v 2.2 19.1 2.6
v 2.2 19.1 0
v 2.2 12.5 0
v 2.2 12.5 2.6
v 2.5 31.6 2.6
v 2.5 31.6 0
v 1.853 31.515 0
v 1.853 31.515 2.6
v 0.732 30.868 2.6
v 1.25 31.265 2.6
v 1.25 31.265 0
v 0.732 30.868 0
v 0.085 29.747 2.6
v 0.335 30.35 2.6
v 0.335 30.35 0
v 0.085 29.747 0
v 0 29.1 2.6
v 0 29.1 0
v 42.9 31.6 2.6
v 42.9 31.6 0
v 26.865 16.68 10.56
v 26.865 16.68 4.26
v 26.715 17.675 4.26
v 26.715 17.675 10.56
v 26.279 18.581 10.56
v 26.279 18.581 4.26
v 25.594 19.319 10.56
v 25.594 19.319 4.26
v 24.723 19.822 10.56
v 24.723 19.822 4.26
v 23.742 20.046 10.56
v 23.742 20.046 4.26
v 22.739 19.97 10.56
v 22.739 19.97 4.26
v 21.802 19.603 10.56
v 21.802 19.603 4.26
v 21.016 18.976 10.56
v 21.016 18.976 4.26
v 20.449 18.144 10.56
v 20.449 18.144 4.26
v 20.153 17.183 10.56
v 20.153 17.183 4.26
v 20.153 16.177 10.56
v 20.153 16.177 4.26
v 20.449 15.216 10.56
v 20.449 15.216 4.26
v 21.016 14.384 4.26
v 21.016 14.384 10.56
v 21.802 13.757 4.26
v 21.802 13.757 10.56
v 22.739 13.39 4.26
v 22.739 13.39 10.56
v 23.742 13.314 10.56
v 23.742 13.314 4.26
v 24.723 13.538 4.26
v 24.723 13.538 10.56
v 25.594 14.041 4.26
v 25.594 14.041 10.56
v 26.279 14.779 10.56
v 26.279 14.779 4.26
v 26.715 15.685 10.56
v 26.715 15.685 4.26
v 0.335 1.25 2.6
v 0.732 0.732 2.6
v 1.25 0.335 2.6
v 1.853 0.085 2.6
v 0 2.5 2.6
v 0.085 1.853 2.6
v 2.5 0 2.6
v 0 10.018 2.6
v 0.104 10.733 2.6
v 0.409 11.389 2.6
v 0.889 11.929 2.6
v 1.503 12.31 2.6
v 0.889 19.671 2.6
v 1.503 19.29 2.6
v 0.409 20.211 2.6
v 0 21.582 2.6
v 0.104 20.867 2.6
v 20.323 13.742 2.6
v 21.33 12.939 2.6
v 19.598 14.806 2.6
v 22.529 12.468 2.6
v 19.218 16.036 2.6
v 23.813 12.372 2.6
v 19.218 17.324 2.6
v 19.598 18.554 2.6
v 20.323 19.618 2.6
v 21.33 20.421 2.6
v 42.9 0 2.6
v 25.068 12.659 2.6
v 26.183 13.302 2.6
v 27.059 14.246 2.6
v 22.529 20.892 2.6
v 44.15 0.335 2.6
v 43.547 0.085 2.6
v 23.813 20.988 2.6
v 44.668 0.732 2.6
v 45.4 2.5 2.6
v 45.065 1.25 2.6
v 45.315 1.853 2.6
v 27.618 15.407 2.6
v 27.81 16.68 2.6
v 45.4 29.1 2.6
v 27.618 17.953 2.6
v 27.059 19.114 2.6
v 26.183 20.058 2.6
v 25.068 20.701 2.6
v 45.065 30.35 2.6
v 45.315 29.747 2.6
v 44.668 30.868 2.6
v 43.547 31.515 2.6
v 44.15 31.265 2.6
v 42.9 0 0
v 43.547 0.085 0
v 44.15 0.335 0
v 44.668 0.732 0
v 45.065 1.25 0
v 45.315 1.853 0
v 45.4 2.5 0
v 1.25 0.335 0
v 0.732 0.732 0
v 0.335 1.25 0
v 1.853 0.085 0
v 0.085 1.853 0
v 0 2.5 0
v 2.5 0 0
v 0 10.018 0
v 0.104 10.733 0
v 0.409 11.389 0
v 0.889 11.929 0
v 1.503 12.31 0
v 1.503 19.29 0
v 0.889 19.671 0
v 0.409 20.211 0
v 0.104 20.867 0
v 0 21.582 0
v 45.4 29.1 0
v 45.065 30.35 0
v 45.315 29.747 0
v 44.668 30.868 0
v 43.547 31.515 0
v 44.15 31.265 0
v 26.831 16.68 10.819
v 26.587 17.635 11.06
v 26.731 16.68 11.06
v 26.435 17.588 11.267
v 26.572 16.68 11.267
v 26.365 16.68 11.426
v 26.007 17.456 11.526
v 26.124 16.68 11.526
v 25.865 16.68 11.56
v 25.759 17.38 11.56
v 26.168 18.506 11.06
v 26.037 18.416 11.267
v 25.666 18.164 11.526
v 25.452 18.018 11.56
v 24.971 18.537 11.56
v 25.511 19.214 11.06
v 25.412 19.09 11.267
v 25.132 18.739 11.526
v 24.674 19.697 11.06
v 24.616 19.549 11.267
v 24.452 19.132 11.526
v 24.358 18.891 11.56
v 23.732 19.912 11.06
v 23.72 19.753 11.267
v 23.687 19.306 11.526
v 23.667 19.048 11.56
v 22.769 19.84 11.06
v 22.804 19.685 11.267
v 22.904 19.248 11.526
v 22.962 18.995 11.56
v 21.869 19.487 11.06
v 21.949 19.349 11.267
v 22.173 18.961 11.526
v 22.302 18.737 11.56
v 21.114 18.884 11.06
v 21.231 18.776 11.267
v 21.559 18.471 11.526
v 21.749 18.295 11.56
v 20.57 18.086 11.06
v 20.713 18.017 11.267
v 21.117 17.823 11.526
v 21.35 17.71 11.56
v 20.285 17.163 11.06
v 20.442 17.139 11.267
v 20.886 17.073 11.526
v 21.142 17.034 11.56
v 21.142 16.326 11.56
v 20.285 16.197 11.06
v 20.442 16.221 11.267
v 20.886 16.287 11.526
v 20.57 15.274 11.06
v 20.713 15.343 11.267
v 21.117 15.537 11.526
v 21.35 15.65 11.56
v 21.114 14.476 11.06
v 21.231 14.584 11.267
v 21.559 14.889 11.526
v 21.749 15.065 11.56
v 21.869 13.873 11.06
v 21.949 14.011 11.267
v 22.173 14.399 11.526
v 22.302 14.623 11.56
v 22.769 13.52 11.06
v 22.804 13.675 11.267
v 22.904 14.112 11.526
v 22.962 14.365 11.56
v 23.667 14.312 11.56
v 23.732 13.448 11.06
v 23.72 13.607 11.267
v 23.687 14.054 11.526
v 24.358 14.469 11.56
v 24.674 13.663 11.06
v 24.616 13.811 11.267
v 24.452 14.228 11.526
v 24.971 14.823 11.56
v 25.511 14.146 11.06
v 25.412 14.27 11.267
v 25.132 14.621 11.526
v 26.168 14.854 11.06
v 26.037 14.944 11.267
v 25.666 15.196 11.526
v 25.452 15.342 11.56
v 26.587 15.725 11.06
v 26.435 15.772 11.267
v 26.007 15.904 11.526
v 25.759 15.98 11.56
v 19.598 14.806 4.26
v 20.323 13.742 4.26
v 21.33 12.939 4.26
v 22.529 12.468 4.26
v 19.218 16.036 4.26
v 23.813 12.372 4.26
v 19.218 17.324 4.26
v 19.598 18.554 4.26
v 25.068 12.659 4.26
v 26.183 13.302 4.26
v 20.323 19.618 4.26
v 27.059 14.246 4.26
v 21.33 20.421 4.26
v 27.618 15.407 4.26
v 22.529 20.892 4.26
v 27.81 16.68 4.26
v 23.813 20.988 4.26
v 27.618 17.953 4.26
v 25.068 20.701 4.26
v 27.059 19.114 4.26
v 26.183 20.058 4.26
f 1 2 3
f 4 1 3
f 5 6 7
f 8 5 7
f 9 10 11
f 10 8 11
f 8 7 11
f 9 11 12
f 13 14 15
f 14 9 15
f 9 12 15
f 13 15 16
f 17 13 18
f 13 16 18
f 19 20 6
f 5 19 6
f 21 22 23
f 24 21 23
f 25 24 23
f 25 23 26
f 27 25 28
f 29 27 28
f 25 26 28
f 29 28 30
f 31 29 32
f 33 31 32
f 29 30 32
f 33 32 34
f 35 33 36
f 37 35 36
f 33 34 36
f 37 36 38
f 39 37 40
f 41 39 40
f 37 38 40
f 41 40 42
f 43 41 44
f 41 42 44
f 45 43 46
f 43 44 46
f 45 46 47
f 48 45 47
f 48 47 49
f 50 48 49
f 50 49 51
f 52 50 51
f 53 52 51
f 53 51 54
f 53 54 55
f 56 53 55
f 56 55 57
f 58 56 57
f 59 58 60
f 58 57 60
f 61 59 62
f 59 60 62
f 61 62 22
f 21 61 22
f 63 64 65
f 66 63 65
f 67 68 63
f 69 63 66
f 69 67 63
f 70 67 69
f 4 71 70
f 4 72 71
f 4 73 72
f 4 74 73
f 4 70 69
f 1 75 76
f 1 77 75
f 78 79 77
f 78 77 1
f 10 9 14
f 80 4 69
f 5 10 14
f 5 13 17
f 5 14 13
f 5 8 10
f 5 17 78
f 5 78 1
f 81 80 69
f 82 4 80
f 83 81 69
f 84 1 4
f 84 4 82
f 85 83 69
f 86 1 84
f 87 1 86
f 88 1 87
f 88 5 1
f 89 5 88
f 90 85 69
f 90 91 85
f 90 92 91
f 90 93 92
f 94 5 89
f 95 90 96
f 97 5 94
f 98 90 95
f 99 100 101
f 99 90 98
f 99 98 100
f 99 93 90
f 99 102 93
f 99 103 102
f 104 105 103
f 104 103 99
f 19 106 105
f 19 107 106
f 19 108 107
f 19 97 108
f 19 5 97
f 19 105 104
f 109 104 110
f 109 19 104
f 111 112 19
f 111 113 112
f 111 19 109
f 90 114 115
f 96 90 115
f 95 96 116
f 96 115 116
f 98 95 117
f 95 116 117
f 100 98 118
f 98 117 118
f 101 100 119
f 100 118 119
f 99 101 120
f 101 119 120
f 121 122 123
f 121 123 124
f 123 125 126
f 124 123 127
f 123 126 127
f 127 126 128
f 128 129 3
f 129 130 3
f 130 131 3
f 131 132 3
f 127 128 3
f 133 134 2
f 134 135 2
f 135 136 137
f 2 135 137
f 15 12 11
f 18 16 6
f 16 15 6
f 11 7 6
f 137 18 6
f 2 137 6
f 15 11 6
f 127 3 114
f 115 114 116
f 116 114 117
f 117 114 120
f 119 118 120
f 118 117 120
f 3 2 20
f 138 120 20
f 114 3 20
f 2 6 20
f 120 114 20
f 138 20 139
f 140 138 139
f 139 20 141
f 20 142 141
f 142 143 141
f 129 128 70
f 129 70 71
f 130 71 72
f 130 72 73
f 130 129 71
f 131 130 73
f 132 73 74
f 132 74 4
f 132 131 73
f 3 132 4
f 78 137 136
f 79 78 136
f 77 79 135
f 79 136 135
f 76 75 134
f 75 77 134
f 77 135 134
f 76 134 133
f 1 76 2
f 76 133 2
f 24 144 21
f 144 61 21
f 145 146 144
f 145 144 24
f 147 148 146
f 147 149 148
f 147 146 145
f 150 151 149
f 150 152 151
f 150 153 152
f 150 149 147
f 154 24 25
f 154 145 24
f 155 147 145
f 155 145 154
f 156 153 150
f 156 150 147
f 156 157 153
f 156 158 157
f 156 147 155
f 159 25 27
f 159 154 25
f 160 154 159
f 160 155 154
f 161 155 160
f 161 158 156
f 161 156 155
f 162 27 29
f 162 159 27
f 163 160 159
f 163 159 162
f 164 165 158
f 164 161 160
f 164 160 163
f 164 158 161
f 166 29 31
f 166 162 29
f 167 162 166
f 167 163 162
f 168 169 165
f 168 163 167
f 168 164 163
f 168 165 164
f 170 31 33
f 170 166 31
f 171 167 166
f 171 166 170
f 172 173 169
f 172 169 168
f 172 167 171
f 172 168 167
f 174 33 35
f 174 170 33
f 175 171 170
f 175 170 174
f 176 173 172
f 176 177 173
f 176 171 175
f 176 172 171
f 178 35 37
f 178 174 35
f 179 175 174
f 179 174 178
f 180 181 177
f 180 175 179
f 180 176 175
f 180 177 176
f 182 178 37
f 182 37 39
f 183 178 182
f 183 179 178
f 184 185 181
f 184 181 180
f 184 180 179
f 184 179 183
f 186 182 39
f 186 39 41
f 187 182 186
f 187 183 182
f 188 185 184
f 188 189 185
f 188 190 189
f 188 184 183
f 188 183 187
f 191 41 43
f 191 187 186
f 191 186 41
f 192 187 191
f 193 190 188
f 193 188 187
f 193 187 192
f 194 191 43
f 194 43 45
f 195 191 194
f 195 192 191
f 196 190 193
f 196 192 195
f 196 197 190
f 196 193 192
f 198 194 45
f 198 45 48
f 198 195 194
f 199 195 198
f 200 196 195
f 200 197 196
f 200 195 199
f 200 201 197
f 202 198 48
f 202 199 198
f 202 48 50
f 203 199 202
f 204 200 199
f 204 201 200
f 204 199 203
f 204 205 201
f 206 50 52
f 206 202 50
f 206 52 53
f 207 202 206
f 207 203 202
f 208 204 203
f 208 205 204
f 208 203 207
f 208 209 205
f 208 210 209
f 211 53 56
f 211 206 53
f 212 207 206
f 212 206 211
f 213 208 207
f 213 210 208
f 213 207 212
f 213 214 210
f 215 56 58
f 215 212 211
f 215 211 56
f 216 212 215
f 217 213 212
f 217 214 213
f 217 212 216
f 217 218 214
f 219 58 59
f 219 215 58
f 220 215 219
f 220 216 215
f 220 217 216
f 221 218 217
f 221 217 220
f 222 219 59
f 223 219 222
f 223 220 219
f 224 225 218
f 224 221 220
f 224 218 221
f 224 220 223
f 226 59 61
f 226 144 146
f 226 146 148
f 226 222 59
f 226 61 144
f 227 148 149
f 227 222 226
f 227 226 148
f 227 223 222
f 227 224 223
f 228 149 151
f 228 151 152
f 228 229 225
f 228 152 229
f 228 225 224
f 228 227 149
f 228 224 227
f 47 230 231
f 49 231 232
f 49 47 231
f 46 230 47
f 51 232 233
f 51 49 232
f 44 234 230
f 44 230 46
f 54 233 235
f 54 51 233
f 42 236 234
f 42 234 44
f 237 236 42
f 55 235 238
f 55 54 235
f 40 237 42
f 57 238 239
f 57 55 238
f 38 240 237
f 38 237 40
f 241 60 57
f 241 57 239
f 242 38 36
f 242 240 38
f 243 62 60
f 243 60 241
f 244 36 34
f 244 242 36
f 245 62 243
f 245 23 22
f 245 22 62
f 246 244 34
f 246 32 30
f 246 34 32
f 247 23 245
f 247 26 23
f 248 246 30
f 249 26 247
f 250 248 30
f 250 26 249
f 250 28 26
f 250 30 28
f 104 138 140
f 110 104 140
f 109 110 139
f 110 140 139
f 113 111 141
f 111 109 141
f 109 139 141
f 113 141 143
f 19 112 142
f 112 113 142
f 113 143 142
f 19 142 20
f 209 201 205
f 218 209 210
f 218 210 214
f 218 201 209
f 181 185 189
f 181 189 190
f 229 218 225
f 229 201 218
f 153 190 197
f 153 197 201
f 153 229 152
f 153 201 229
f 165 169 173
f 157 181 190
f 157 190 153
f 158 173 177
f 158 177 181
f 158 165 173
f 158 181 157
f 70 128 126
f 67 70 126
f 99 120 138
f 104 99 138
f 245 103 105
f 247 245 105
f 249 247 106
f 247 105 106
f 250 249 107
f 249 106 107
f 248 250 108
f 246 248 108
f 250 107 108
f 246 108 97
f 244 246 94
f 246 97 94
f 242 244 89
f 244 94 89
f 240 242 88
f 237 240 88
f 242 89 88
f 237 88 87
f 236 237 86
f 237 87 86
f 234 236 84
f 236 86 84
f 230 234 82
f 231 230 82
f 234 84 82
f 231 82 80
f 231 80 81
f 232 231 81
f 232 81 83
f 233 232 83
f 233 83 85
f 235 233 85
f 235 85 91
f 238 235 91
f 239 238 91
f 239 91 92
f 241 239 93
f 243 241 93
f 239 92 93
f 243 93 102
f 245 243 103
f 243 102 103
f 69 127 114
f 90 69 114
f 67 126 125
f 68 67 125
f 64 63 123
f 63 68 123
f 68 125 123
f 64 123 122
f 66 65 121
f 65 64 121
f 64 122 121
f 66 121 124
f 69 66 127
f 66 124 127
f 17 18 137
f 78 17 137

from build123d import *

# Parameters (mm, degrees)
F1_DEPTH    = 2.6
F2_T1_DEPTH = 15.1
F2_T3_DEPTH = 15.009673646
F3_R        = 4.32
F4_DEPTH    = 1.66
F5_R        = 3.375
F6_DEPTH    = 7.3
F7_R        = 1


# Not quite as in the source:
# - a fillet or chamfer that OpenCascade refuses, or shapes differently, is made with other operations: its cross-section is extruded or revolved along the edge and cut away or added


with BuildPart() as f1:
    # F0 (on Top) → F1 (new body)
    with BuildSketch(Plane.XY):
        Polygon((0, 12.5), (0, 0), (45.4, 0), (45.4, 31.6), (0, 31.6), (0, 19.1), (2.2, 19.1), (2.2, 12.5), align=None)
    extrude(amount=F1_DEPTH)

    # F2: fillet of radius 2.5 on 6 edges, made by hand

    # F2_s2 → F2_t1 (cut)
    with BuildSketch(Plane.XY.offset(-6.25)):
        with BuildLine():
            ThreePointArc((45.4, 29.1), (44.667766953, 30.867766953), (42.9, 31.6))
            Line((42.9, 31.6), (45.4, 31.6))
            Line((45.4, 31.6), (45.4, 29.1))
        make_face()
        with BuildLine():
            ThreePointArc((2.5, 31.6), (0.732233047, 30.867766953), (0, 29.1))
            Line((0, 29.1), (0, 31.6))
            Line((0, 31.6), (2.5, 31.6))
        make_face()
        with BuildLine():
            ThreePointArc((42.9, 0), (44.667766953, 0.732233047), (45.4, 2.5))
            Line((45.4, 2.5), (45.4, 0))
            Line((45.4, 0), (42.9, 0))
        make_face()
        with BuildLine():
            ThreePointArc((0, 2.5), (0.732233047, 0.732233047), (2.5, 0))
            Line((2.5, 0), (0, 0))
            Line((0, 0), (0, 2.5))
        make_face()
    extrude(amount=F2_T1_DEPTH, mode=Mode.SUBTRACT)

    # F2_s4 → F2_t3 (cut)
    with BuildSketch(Plane.XY.offset(-6.204836823)):
        with BuildLine():
            ThreePointArc((0, 21.5819347292), (0.6291713066, 19.923622334), (2.2, 19.1))
            Line((2.2, 19.1), (0, 19.1))
            Line((0, 19.1), (0, 21.5819347292))
        make_face()
        with BuildLine():
            ThreePointArc((0, 10.0180652708), (0.6291713066, 11.676377666), (2.2, 12.5))
            Line((2.2, 12.5), (0, 12.5))
            Line((0, 12.5), (0, 10.0180652708))
        make_face()
    extrude(amount=F2_T3_DEPTH, mode=Mode.SUBTRACT)

    # F3 (on face) → F4 (join)
    with BuildSketch(Plane.XY.offset(2.6)):
        with Locations((23.49, 16.68)):
            Circle(F3_R)
    extrude(amount=F4_DEPTH)

    # F5 (on face) → F6 (join)
    with BuildSketch(Plane.XY.offset(4.26)):
        with Locations((23.49, 16.68)):
            Circle(F5_R)
    extrude(amount=F6_DEPTH)

    # F7
    f7_edges = [f1.edges().sort_by_distance(p)[0] for p in [
        (20.115, 16.68, 11.56),
    ]]
    fillet(f7_edges, radius=F7_R)


solid = f1.part
